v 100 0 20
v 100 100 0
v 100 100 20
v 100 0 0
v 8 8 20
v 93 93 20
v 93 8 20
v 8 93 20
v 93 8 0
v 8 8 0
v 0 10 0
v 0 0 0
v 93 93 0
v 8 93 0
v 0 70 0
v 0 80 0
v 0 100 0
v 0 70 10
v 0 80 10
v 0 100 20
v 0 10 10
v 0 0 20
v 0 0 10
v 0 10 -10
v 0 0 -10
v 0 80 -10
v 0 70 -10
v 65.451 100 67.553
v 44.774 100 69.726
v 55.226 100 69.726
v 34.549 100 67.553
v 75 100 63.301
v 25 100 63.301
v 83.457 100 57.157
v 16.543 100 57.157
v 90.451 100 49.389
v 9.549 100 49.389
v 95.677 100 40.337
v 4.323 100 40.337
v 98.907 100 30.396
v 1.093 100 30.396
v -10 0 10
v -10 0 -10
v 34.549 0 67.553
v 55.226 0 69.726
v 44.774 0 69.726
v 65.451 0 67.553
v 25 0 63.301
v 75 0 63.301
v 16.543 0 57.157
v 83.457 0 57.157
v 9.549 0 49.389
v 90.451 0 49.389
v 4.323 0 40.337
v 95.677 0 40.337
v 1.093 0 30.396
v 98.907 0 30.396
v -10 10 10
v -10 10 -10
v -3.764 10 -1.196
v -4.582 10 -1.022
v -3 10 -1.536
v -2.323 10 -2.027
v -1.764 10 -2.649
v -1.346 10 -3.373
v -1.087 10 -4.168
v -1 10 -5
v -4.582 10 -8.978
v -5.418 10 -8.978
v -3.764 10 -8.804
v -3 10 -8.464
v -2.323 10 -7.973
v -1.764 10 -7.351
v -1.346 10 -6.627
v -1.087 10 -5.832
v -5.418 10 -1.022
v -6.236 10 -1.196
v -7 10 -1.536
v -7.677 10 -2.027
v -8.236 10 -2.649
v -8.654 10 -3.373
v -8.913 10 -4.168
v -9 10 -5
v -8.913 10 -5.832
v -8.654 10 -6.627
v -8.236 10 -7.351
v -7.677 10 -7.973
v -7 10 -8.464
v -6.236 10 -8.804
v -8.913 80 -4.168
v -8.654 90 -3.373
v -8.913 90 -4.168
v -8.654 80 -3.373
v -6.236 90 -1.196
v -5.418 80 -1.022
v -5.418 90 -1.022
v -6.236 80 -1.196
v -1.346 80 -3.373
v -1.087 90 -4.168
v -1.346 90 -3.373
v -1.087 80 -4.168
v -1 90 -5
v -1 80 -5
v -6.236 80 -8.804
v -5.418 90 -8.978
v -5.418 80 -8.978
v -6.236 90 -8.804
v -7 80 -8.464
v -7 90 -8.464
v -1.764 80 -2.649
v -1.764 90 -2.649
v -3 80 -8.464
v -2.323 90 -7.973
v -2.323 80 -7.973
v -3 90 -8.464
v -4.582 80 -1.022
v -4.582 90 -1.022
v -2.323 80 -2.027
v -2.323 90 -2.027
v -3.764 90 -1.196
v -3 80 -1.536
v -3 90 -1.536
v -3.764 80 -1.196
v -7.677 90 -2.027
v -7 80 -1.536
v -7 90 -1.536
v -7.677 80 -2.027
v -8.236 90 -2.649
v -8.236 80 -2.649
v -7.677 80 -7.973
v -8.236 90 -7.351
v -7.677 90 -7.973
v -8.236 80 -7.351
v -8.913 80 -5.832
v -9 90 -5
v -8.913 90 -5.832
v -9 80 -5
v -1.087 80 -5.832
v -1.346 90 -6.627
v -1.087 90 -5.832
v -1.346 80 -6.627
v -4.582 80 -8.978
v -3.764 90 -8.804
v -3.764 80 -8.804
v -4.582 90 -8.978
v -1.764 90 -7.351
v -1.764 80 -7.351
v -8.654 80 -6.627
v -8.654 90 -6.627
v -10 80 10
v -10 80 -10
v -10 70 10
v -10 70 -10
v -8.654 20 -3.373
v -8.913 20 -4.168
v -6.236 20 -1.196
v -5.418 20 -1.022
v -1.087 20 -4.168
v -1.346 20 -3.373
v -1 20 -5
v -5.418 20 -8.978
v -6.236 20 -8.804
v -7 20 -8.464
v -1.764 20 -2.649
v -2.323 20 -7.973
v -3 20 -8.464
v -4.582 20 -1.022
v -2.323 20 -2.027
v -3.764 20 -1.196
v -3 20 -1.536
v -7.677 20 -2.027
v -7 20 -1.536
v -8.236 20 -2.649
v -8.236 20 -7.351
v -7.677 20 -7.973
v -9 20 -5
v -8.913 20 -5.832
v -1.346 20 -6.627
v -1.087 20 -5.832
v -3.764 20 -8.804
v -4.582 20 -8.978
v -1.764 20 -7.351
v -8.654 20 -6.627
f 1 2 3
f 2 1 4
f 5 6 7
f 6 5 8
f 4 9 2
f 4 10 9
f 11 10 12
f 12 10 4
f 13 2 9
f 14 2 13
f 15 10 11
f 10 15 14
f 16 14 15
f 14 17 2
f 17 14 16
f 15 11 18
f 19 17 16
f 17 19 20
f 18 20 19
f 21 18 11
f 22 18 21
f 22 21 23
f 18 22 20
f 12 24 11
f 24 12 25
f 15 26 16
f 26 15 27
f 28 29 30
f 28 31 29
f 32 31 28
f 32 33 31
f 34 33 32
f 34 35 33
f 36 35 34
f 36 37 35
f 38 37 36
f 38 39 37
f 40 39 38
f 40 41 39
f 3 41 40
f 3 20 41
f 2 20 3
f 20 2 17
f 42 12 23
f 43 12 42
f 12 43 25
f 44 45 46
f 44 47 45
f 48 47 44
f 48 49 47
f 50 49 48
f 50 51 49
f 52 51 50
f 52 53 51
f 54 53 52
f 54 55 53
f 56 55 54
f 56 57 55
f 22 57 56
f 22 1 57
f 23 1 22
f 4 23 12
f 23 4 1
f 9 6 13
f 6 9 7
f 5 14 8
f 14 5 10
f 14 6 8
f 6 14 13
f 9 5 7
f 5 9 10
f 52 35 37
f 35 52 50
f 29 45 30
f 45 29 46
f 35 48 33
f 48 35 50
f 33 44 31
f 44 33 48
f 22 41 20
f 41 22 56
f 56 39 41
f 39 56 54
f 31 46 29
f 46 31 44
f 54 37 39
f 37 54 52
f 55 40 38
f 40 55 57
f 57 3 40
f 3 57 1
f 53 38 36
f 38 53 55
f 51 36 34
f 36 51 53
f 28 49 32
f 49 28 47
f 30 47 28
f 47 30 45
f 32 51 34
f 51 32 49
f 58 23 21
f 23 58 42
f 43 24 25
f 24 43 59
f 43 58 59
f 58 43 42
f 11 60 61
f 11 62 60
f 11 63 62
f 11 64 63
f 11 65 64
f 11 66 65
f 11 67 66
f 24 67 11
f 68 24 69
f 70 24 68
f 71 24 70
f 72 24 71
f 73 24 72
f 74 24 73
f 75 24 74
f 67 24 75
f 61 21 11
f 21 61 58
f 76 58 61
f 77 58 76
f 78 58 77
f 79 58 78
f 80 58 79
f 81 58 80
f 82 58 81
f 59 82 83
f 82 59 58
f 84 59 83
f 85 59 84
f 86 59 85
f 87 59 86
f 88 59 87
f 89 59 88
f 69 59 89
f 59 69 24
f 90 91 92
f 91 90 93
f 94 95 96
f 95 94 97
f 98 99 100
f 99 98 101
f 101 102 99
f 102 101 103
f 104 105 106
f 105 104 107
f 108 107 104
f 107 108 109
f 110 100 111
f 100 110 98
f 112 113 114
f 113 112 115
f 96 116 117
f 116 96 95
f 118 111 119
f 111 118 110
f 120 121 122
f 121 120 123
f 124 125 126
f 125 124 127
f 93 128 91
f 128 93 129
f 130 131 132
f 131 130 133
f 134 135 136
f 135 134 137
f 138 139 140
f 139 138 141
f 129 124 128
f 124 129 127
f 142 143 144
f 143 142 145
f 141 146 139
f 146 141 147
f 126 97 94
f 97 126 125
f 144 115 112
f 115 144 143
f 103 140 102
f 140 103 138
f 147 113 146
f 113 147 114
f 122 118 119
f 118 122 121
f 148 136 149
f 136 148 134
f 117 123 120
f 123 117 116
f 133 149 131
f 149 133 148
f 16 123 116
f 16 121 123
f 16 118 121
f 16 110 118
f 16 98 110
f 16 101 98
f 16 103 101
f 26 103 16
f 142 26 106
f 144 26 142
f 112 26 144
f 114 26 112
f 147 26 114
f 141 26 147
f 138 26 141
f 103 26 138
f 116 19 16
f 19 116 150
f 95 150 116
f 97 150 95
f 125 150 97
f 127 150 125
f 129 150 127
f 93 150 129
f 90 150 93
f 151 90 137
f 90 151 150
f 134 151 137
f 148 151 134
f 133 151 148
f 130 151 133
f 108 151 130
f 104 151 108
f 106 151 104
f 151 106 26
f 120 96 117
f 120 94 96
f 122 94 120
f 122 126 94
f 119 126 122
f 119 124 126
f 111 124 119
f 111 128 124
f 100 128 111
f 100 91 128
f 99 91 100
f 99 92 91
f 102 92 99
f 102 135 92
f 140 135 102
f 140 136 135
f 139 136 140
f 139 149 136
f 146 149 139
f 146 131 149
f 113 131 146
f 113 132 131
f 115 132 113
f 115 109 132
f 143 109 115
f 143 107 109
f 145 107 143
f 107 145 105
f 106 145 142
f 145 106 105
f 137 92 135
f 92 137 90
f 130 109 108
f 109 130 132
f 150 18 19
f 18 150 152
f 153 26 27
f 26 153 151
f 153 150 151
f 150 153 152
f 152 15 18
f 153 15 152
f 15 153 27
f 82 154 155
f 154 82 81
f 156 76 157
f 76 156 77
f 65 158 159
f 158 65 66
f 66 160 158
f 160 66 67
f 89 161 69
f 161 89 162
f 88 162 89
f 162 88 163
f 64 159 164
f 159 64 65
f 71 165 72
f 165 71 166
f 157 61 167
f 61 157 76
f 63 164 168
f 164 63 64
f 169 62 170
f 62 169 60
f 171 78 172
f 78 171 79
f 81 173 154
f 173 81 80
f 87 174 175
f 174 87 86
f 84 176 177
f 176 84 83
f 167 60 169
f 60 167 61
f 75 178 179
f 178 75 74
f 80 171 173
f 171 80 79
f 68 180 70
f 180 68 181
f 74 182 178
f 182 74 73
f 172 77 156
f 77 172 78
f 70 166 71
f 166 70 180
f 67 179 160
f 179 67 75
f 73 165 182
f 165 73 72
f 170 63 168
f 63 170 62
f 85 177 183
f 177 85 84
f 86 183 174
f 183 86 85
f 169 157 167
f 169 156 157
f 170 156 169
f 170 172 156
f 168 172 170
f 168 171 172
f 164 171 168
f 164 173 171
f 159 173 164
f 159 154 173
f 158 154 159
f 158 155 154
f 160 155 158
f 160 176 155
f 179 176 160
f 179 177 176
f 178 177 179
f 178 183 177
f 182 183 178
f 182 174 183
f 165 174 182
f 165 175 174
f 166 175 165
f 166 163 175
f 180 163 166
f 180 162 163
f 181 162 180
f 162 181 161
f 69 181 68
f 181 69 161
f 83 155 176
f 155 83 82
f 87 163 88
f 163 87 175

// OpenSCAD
$fn=30;
width=100;
depth=100;
height=20;
width1=85;
depth1=85;
height1=25;
width2=100;
depth2=100;
height2=100;
height3=100;
rayon3=50;
width4=10;
depth4=10;
height4=20;
height5=10;
rayon5=4;


//
//Empty space under the half cylinder
//
difference(){
cube([width,depth,height]);
translate([8,8,0])cube([width1,depth1,height1]);
}

//
//Half cylinder that makes the back portion of the lid
//
intersection(){	
translate([-50,20,20])translate([0,-20,0])cube([width2,depth2,height2]);
translate([50,100,20])rotate([90,0,0])cylinder(h=height3,r=rayon3);
}

//
//Half cylinder that makes the front portion of the lid
//
intersection(){	
translate([50,20,20])translate([0,-20,0]) cube([width2,depth2,height2]);
translate([50,100,20])rotate([90,0,0])cylinder(h=height3,r=rayon3);
}

//
//Cylinder makes part of the hinges on the left and cube makes the support from the hinge to the lid
//
translate([-10,0,-10])cube([width4,depth4,height4]);
translate([-5,90,-5])rotate([90,0,0])cylinder(h=height5,r=rayon5);

//
//Cylinder makes part of the hinges on the right and cube makes the support from the hinge to the lid
//
translate([-10,70,-10])cube([width4,depth4,height4]);
translate([-5,20,-5])rotate([90,0,0])cylinder(h=height5,r=rayon5);
